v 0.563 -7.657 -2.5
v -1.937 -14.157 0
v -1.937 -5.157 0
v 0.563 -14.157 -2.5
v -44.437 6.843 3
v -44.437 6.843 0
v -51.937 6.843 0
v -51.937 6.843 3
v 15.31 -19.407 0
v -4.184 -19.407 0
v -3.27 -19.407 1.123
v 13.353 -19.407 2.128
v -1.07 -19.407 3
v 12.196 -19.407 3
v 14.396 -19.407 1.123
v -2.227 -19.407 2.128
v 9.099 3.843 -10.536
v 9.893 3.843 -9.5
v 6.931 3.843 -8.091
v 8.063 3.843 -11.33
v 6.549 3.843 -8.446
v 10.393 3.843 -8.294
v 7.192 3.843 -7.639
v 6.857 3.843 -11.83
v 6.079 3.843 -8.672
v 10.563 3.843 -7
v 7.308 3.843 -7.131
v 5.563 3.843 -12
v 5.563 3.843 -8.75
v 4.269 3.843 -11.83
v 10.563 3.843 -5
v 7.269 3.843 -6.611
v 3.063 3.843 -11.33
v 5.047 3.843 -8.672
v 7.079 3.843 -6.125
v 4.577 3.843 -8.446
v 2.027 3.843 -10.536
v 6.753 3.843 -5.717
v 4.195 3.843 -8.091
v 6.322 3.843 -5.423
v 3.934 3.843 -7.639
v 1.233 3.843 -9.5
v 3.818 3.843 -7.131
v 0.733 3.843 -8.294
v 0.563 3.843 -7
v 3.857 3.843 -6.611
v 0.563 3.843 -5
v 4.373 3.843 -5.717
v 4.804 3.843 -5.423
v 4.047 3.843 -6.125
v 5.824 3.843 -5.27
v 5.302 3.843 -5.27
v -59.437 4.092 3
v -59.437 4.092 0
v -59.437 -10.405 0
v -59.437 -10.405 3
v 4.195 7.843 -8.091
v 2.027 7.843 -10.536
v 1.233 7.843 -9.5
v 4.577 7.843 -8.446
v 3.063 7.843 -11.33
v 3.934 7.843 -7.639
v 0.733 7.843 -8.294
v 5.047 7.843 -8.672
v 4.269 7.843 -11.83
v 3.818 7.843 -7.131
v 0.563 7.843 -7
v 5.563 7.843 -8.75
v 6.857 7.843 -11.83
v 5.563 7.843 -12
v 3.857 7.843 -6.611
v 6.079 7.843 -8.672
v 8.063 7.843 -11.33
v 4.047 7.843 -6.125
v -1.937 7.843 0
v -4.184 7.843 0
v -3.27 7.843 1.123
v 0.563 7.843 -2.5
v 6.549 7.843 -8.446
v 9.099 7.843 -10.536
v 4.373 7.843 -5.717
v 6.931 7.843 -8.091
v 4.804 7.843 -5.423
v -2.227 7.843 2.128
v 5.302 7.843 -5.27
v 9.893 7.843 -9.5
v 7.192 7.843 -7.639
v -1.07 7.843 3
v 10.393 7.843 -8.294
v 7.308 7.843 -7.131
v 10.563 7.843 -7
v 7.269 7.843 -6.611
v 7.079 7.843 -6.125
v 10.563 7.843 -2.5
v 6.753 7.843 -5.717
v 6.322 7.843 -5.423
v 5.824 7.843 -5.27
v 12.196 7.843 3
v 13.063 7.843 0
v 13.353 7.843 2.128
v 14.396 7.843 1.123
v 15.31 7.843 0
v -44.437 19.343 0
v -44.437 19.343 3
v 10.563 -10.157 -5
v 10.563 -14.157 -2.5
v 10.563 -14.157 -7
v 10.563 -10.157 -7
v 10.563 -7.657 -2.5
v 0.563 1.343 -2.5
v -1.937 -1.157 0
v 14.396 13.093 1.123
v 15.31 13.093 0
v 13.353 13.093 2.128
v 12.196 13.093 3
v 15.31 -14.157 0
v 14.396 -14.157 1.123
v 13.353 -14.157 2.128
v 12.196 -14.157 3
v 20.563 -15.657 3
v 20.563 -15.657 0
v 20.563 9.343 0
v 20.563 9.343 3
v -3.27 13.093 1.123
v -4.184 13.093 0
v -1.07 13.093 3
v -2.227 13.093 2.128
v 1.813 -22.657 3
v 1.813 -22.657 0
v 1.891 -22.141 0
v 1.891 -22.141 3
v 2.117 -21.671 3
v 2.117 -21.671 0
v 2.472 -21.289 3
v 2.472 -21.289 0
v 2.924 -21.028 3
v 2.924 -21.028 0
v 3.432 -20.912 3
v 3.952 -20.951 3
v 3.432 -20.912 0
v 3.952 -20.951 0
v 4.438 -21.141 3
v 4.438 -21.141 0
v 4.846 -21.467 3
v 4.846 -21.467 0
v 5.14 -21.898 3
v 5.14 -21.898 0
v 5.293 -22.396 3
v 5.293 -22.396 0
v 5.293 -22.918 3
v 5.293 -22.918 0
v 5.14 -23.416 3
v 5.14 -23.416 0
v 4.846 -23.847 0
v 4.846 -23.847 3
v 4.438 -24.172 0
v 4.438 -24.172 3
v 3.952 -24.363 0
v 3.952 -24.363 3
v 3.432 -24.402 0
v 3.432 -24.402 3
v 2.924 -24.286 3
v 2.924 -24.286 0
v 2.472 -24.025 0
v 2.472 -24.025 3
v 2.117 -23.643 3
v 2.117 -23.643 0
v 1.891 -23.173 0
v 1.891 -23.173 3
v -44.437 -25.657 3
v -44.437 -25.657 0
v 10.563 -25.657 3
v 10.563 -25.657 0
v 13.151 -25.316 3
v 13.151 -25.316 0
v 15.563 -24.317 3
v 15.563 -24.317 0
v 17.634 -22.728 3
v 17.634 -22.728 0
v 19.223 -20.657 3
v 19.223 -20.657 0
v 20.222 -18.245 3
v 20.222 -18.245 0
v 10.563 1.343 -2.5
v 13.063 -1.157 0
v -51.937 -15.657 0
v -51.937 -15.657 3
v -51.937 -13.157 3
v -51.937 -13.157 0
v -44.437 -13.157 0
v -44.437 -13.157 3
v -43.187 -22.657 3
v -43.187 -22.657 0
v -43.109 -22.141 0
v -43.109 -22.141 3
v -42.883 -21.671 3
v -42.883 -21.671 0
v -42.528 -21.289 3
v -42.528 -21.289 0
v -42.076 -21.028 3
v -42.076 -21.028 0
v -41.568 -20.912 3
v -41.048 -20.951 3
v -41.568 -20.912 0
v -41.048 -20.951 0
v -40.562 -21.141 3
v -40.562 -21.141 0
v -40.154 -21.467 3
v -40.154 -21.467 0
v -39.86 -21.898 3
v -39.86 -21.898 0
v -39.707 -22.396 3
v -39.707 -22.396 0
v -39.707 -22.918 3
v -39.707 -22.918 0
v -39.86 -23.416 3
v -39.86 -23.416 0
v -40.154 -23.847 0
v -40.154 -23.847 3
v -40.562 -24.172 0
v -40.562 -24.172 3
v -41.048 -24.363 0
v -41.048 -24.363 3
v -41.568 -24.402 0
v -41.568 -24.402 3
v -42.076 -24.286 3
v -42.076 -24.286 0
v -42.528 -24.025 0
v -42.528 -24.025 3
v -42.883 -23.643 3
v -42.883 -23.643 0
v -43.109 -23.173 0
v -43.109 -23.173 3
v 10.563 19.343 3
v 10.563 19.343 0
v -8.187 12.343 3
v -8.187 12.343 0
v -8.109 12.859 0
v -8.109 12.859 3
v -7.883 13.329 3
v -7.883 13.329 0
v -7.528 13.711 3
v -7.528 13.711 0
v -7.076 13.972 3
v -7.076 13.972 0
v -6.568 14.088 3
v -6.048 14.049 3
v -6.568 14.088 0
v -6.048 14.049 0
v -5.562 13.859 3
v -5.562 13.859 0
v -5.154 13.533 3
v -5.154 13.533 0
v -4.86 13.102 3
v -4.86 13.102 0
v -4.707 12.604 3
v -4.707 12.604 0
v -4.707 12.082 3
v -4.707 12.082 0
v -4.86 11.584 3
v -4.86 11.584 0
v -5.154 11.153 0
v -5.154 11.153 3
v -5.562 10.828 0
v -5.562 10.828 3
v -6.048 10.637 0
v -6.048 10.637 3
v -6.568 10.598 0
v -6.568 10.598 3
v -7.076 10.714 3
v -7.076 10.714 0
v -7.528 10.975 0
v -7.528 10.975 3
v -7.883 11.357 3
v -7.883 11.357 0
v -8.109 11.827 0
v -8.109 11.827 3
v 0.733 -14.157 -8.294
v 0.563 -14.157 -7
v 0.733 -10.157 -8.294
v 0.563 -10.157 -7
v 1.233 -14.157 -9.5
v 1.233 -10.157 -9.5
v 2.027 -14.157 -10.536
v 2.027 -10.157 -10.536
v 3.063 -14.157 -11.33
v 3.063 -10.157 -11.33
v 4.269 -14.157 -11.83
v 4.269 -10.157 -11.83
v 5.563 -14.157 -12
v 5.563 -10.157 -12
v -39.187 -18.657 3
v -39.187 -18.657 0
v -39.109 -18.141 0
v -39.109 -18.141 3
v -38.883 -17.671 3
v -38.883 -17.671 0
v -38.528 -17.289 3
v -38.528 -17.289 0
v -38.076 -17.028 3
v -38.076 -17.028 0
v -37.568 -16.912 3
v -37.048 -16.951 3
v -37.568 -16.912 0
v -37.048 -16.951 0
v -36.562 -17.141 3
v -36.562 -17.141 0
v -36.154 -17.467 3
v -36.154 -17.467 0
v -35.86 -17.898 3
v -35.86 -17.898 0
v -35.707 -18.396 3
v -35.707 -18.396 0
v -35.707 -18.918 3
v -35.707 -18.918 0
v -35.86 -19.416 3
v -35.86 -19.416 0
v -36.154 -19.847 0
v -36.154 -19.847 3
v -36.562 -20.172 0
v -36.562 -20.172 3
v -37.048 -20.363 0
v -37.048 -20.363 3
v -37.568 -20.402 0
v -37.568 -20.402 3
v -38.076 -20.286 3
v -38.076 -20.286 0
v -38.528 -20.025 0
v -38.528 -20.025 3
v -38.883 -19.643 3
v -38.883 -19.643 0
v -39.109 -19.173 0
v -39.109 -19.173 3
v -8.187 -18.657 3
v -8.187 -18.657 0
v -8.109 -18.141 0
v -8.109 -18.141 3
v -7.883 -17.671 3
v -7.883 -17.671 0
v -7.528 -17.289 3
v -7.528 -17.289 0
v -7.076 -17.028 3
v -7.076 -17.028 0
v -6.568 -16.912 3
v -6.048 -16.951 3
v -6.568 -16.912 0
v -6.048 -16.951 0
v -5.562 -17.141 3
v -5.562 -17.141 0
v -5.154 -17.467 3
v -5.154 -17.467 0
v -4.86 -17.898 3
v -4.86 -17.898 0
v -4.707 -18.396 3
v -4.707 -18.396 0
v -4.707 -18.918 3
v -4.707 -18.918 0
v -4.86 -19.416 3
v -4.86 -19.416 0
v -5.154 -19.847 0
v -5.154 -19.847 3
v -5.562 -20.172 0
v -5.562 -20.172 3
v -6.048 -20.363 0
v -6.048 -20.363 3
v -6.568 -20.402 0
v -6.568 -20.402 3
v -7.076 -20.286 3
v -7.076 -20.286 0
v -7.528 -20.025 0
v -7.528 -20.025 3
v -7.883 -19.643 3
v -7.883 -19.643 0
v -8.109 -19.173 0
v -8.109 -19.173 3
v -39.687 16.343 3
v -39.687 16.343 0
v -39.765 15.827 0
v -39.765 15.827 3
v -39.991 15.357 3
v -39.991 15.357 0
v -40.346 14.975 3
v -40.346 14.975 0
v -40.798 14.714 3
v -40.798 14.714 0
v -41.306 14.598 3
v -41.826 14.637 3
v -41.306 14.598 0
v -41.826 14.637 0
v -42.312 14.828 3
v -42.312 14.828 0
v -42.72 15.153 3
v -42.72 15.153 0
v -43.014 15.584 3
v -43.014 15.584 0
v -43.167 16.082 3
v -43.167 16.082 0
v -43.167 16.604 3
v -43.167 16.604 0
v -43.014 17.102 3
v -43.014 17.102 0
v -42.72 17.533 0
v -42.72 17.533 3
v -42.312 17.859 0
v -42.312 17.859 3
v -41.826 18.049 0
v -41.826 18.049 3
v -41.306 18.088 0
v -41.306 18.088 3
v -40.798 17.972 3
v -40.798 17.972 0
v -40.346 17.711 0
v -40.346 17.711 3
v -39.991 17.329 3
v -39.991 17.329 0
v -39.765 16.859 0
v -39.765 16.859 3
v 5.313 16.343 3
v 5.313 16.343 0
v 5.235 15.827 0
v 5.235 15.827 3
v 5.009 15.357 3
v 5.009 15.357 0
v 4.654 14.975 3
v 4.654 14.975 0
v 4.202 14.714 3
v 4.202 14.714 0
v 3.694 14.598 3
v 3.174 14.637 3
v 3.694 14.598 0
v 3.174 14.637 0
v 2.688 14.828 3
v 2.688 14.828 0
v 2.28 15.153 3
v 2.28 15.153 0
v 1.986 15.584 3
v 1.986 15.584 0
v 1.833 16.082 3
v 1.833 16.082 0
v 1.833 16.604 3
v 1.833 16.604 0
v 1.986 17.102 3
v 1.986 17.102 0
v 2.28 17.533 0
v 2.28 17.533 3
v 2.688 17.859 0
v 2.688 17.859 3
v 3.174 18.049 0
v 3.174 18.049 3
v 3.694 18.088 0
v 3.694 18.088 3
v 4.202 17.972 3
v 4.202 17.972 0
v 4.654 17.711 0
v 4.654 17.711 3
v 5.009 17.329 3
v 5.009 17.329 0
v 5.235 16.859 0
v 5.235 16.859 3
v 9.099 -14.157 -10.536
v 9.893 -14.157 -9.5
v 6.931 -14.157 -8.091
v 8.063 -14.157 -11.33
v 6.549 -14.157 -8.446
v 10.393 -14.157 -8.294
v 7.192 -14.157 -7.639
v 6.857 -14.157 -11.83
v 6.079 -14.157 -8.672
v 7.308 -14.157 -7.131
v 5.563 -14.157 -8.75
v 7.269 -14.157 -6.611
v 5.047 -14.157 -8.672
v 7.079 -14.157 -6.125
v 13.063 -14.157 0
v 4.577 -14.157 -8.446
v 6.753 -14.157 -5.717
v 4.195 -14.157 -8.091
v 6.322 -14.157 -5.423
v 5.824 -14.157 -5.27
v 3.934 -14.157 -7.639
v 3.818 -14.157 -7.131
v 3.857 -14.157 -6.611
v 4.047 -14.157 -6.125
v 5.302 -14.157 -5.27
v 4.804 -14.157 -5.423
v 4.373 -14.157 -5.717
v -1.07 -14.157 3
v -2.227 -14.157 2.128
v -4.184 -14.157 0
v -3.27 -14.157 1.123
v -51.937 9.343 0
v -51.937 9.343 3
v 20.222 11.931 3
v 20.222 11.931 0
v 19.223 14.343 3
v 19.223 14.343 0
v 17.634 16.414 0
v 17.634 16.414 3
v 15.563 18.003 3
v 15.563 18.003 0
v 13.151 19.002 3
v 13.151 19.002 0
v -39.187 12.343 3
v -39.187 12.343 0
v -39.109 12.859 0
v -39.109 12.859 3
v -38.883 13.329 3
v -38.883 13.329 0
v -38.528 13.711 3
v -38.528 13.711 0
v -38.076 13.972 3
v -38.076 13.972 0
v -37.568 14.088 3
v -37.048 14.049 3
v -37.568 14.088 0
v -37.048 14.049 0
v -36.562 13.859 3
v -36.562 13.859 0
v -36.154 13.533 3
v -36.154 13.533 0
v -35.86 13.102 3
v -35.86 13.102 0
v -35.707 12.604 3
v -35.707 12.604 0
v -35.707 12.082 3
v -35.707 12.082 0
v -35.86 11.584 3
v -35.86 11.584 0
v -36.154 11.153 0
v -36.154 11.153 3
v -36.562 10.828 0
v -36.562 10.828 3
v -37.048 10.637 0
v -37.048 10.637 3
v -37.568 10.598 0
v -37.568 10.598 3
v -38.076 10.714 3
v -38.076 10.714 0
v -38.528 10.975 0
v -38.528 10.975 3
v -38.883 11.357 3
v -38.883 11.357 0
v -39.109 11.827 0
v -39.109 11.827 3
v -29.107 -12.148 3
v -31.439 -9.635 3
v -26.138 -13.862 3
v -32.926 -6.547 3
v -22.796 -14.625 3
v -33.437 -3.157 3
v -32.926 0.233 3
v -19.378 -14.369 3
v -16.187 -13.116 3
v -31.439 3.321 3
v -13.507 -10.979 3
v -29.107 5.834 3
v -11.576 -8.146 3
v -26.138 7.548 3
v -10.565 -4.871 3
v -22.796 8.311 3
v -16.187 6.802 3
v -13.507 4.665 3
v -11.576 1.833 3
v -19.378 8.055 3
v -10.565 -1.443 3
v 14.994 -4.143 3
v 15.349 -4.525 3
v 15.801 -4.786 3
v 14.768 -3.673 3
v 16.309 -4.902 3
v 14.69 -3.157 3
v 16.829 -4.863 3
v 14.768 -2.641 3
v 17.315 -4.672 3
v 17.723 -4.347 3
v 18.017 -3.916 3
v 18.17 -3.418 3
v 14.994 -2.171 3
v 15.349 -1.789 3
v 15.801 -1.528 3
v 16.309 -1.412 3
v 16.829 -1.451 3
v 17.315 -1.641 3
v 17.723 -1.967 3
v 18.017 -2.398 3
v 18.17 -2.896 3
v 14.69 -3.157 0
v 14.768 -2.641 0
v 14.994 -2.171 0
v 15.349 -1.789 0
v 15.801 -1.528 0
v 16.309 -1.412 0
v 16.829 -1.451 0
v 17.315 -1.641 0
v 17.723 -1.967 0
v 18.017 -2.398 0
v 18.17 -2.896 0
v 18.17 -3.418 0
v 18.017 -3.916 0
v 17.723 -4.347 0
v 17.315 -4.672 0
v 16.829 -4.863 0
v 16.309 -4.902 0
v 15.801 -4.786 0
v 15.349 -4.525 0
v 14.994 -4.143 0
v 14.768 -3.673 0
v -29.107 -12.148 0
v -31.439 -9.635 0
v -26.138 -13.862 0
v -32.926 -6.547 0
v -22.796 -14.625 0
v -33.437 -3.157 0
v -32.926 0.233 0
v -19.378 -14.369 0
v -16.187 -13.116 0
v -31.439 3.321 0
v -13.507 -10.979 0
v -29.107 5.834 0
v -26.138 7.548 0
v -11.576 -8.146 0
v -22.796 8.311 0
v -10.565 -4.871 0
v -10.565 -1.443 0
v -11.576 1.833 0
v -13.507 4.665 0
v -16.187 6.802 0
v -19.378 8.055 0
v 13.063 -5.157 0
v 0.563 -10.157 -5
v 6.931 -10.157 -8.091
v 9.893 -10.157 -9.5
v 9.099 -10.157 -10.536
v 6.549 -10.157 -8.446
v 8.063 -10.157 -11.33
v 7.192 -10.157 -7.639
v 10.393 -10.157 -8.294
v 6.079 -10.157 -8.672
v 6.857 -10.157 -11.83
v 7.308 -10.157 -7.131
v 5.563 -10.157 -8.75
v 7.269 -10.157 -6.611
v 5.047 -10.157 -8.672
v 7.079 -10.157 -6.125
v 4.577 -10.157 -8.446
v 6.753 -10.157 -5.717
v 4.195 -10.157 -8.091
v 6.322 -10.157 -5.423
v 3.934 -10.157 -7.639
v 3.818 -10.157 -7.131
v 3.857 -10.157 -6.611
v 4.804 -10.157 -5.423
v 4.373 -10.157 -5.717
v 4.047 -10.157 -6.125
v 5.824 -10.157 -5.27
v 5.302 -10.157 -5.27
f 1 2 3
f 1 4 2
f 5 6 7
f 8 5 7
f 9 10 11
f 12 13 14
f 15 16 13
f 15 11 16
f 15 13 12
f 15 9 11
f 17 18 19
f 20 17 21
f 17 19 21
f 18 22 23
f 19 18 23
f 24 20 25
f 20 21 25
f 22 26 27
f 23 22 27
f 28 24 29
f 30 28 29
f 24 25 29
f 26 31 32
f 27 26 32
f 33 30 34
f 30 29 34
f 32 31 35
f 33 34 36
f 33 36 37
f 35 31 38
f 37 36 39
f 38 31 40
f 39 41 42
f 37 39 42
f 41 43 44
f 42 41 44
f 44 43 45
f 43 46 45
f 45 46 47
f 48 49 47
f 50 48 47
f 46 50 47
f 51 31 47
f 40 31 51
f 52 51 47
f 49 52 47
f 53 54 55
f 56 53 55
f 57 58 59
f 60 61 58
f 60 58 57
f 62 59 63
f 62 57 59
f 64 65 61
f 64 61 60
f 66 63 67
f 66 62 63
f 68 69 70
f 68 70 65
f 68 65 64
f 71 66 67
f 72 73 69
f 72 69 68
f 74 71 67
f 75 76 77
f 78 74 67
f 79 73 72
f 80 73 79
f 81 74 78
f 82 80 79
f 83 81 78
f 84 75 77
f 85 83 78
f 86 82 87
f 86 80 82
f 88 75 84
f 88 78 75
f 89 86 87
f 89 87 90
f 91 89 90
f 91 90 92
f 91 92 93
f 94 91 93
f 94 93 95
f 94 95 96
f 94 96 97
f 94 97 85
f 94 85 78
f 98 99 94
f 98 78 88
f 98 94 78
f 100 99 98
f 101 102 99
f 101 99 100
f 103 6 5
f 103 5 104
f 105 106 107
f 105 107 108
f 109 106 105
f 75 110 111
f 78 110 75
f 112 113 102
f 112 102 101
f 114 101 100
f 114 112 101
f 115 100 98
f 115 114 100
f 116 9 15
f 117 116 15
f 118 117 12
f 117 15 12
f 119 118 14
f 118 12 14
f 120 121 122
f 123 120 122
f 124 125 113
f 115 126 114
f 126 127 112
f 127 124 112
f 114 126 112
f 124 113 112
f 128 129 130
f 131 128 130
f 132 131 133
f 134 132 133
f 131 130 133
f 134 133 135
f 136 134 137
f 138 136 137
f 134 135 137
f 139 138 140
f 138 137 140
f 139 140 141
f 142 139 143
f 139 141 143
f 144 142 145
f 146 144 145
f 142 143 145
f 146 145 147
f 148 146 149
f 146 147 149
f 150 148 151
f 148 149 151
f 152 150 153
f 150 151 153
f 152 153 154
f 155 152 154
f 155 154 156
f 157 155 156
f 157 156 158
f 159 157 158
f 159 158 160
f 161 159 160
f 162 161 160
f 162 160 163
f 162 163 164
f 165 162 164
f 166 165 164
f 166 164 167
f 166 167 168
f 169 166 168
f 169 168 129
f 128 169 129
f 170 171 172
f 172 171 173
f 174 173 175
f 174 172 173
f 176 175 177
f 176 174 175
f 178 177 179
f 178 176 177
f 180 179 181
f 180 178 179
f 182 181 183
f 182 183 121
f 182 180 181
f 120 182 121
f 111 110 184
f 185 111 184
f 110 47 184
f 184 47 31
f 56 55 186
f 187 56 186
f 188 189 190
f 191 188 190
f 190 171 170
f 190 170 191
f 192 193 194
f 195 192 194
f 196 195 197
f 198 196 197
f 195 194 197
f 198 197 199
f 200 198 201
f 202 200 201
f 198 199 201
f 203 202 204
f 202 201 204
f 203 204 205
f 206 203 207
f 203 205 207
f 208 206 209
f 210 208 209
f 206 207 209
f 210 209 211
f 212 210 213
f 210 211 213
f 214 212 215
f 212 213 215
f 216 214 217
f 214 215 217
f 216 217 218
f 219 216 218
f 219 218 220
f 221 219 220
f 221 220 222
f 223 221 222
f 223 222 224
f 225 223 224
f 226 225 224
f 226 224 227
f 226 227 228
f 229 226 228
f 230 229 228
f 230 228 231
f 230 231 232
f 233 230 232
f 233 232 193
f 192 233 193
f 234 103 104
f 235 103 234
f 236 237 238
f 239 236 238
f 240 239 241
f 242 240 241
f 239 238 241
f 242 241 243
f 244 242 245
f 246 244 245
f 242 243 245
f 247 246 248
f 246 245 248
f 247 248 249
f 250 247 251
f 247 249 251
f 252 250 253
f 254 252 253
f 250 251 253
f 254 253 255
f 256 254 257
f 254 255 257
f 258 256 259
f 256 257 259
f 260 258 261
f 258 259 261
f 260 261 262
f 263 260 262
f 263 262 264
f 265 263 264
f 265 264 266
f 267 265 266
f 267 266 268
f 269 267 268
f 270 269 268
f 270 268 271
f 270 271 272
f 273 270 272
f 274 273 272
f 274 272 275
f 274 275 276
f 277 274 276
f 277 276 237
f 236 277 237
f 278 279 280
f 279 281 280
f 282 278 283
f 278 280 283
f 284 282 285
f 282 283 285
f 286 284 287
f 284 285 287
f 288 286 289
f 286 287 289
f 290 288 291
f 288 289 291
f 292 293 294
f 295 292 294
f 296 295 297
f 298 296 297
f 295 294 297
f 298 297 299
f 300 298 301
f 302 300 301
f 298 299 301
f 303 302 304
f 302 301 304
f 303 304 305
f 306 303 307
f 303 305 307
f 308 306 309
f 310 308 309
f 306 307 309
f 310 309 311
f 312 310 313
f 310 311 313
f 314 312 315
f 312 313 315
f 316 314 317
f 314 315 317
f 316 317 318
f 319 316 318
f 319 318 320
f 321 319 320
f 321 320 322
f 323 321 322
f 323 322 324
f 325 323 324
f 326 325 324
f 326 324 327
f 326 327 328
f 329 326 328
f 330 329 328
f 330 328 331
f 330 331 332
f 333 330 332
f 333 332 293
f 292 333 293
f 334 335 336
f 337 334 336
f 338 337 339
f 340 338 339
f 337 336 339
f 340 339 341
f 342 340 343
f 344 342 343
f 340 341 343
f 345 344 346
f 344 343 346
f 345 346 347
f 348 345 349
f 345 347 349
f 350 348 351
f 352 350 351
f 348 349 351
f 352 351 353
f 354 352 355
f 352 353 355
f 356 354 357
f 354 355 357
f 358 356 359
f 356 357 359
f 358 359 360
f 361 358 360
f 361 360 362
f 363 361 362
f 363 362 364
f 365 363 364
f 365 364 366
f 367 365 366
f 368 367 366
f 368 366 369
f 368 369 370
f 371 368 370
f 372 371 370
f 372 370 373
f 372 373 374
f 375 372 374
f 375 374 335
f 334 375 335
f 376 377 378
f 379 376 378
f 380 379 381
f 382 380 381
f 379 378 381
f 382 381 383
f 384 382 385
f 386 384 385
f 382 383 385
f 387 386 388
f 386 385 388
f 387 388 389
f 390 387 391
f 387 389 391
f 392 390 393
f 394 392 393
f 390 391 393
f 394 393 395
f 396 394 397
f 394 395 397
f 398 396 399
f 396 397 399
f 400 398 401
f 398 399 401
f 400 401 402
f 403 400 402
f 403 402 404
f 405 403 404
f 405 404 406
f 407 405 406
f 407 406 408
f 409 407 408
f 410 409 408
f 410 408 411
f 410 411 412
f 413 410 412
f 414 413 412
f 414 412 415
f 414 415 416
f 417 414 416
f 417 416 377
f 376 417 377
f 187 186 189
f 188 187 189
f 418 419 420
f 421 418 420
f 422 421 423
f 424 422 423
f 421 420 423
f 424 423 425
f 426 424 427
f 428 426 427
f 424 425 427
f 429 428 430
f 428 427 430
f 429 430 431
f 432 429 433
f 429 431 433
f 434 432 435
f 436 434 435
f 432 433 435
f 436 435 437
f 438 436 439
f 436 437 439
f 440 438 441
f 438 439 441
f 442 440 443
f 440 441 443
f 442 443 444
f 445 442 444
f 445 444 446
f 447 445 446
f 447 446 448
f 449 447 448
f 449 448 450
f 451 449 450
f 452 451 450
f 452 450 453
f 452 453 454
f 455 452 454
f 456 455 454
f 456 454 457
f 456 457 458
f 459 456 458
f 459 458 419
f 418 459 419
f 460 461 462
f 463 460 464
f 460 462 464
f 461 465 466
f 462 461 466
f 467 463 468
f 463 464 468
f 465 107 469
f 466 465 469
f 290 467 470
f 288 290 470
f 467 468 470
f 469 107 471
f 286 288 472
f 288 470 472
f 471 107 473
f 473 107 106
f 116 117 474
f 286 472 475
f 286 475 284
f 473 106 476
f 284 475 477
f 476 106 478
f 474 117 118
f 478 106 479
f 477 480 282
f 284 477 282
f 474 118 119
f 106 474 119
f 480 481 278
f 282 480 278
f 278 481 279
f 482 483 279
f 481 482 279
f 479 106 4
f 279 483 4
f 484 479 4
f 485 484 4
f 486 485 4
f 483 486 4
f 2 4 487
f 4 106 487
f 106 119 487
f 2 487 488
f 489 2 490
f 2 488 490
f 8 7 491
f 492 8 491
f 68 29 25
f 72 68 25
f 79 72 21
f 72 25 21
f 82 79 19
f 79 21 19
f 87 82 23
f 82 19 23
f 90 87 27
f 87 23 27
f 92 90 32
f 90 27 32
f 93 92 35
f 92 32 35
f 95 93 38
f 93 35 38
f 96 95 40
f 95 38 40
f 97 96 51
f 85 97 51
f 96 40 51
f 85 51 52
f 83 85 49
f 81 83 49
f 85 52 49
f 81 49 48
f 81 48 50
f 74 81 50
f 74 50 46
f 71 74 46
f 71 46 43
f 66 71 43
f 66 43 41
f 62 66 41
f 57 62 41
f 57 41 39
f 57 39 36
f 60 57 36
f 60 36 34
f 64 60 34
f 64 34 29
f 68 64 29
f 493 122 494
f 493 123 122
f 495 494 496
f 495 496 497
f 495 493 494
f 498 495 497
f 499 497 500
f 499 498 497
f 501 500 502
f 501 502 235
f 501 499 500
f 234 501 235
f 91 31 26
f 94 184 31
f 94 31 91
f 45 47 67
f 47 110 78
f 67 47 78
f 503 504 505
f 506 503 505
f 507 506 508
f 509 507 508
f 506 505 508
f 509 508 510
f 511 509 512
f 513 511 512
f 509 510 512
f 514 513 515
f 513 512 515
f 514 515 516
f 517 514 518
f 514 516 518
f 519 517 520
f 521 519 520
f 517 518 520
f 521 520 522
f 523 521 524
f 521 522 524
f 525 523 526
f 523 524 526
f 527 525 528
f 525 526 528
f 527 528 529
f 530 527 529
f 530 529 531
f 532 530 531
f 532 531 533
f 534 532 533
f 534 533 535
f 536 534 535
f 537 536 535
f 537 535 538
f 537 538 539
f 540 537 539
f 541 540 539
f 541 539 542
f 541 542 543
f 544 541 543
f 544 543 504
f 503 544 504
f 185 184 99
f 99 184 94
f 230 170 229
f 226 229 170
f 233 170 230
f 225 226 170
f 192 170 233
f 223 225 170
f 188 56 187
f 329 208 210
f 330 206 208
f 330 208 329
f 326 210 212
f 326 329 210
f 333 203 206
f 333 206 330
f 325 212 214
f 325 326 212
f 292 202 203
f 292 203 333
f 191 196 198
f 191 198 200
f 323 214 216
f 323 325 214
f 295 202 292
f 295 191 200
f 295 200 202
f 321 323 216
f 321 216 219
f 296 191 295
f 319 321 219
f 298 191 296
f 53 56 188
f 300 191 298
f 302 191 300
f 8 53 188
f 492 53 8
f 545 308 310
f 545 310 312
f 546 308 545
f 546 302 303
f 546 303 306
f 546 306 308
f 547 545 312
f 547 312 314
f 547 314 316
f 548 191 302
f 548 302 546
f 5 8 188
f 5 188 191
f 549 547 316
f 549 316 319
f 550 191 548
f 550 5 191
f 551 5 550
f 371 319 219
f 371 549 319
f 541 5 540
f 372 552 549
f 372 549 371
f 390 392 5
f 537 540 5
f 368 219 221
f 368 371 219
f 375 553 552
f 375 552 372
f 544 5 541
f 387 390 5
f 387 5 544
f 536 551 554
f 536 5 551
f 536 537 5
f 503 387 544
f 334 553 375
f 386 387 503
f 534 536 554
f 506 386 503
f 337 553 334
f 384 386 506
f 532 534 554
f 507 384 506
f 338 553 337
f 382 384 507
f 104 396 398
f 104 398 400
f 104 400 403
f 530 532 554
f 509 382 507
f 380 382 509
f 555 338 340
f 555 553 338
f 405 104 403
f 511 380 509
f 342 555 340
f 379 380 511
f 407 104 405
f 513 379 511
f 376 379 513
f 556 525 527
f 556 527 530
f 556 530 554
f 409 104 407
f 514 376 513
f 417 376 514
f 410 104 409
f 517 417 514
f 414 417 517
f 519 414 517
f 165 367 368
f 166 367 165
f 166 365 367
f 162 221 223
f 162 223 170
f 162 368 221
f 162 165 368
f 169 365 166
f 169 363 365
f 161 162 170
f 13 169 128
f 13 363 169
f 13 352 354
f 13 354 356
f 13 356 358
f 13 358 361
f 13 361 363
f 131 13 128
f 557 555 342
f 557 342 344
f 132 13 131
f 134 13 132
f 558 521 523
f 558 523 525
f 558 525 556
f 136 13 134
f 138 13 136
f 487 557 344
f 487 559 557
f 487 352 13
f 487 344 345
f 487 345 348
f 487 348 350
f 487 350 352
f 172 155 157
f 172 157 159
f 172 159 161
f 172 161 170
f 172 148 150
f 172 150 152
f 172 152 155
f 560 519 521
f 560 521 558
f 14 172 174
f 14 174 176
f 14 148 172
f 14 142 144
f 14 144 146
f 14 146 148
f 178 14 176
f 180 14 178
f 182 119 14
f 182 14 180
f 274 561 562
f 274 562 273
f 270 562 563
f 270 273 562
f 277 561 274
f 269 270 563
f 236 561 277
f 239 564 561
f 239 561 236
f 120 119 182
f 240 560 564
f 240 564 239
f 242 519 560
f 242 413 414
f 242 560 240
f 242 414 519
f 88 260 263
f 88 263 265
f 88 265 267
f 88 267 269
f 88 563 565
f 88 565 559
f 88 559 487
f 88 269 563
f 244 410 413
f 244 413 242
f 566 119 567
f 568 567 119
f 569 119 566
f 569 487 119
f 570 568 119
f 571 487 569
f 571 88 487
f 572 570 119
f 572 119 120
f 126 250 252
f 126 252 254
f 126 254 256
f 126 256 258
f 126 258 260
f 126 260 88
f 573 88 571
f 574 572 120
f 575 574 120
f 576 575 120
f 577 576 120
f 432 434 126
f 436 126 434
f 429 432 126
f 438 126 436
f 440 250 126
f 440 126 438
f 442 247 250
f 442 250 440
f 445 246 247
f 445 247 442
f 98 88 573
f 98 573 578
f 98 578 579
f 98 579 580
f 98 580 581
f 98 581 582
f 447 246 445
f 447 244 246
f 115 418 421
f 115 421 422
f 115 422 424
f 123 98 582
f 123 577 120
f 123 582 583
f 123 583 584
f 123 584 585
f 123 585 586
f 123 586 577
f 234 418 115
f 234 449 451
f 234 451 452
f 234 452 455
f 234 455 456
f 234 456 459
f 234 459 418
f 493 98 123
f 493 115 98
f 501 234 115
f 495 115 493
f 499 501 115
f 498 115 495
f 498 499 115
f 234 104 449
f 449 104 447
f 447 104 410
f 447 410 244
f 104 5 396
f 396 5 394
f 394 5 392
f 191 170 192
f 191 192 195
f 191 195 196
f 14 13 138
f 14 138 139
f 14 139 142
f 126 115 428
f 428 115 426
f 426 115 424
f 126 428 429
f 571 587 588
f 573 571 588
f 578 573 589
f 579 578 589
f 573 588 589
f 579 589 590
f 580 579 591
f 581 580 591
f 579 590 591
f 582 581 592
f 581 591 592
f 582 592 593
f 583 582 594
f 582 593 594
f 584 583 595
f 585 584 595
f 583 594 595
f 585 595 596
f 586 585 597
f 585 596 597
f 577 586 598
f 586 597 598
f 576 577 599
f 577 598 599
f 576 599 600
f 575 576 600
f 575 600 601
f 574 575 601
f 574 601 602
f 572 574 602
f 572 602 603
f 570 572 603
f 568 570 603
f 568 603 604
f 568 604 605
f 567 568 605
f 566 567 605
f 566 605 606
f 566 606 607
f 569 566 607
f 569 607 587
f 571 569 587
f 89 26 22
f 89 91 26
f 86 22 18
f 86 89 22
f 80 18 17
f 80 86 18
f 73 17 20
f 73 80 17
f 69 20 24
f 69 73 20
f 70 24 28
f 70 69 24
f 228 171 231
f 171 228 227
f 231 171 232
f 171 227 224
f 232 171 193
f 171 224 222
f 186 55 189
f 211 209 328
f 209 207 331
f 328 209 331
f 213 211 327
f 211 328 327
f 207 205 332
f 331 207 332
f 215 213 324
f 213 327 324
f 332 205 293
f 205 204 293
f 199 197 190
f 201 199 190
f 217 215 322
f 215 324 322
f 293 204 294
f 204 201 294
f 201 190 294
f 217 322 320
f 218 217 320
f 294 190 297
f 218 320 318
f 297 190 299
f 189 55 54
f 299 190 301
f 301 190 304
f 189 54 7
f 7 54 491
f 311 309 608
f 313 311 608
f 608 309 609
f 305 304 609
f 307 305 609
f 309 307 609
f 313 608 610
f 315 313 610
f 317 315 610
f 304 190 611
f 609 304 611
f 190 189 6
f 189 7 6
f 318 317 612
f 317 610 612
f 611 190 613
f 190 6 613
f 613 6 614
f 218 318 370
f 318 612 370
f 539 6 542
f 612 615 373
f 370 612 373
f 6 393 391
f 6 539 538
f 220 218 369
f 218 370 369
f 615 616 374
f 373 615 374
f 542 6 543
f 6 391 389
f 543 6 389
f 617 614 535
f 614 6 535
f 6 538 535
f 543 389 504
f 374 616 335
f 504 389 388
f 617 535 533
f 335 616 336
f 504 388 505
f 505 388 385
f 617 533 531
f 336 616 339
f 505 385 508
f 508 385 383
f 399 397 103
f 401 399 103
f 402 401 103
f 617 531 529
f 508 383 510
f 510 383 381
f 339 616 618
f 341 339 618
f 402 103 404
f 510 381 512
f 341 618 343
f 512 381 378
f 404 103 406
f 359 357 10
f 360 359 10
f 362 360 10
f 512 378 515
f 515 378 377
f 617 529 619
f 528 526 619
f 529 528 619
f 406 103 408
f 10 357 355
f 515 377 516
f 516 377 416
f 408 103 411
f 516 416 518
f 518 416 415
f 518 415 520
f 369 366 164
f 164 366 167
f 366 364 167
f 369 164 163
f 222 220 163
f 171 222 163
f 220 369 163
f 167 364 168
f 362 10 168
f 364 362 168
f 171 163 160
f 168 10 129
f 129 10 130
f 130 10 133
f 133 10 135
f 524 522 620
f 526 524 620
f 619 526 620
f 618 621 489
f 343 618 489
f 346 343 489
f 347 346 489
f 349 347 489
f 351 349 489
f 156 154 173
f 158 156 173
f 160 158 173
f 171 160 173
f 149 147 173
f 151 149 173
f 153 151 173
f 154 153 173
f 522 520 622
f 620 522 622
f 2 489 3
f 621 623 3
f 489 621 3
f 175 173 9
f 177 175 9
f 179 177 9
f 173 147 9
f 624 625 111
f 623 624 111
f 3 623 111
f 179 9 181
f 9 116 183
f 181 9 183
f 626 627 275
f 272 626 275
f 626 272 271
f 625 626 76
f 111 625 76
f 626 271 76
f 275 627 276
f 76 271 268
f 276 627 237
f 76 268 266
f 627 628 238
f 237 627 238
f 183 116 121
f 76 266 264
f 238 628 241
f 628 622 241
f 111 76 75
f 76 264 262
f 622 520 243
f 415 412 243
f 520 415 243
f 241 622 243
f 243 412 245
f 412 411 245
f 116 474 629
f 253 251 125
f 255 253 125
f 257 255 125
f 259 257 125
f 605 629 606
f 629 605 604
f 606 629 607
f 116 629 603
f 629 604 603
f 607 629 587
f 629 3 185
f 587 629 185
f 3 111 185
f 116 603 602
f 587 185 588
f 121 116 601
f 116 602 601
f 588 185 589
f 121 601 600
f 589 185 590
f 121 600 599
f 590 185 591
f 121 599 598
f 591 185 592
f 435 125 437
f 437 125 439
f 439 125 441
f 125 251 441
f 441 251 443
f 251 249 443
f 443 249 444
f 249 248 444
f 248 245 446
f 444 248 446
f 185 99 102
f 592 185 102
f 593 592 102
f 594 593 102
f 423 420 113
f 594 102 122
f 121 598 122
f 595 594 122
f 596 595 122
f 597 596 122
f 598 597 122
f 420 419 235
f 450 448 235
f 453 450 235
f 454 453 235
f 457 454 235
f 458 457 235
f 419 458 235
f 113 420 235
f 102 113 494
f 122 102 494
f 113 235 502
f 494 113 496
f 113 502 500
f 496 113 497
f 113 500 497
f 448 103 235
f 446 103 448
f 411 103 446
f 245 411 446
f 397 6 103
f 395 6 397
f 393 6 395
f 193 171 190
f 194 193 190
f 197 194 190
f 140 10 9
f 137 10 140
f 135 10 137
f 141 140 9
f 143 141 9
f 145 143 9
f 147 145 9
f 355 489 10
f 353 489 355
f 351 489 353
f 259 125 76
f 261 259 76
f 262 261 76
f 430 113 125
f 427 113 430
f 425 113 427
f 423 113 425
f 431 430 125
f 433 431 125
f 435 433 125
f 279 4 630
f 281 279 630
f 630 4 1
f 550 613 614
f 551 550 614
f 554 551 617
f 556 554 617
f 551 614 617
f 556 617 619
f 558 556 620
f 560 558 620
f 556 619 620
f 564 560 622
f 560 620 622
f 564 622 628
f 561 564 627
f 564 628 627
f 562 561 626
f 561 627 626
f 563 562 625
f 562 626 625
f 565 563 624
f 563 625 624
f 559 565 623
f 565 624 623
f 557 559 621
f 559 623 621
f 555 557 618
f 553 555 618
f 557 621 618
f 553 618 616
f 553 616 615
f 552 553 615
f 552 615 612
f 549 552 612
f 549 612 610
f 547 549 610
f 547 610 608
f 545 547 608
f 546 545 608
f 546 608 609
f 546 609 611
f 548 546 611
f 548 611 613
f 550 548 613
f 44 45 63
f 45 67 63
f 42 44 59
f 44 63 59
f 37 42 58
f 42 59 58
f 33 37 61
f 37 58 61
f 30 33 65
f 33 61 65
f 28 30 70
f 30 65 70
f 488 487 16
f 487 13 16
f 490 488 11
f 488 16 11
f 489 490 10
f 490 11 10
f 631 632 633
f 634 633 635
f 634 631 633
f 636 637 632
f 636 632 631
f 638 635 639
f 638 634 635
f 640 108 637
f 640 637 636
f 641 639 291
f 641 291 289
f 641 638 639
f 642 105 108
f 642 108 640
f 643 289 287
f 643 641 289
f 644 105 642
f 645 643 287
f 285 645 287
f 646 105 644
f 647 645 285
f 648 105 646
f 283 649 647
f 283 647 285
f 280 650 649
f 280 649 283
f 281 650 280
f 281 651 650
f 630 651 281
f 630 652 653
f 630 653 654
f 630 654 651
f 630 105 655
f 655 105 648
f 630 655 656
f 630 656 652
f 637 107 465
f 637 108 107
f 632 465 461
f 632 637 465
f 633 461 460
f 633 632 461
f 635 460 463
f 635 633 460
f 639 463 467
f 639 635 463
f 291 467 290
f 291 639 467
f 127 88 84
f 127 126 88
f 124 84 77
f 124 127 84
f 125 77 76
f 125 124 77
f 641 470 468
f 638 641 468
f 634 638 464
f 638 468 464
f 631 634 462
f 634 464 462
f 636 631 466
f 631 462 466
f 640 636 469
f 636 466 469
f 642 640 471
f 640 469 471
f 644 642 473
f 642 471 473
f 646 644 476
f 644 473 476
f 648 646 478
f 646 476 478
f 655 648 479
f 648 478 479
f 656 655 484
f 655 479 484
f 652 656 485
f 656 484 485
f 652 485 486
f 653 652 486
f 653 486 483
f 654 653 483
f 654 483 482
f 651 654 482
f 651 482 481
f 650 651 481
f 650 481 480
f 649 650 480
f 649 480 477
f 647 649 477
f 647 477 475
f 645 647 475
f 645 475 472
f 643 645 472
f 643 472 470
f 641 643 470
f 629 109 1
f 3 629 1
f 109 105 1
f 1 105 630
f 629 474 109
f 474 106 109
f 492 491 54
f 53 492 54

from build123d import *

# Parameters (mm, degrees)
SKETCH1_W           = 65
SKETCH1_H           = 45
BOSS_EXTRUDE1_DEPTH = 3
FILLET4_R           = 10
BOSS_EXTRUDE4_DEPTH = 3
SKETCH9_R           = 1.75
CUT_EXTRUDE5_DEPTH  = 5
SKETCH10_R          = 1.75
SKETCH10_R_2        = 11.5
CUT_EXTRUDE6_DEPTH  = 5
SKETCH2_W           = 10
SKETCH2_H           = 4
BOSS_EXTRUDE5_DEPTH = 12
SKETCH11_R          = 1.75
CUT_EXTRUDE7_DEPTH  = 22
CHAMFER3_SIZE       = 2.5
CHAMFER4_SIZE       = 5
FILLET5_R           = 5
SKETCH13_W          = 12
SKETCH13_H          = 5.25


with BuildPart() as part:
    # Sketch1 → Boss-Extrude1 (new body)
    with BuildSketch(Plane.XY):
        with Locations((-11.936997319, -3.156836461)):
            Rectangle(SKETCH1_W, SKETCH1_H)
    extrude(amount=BOSS_EXTRUDE1_DEPTH)

    # Fillet4
    fillet4_edges = [part.edges().sort_by_distance(p)[0] for p in [
        (20.563002681, 19.343163539, 1.5),
        (20.563002681, -25.656836461, 1.5),
    ]]
    fillet(fillet4_edges, radius=FILLET4_R)

    # Sketch8 → Boss-Extrude4 (add)
    with BuildSketch(Plane(origin=(0, 0, 0), x_dir=(-1, 0, 0), z_dir=(0, 0, -1))):
        Polygon((44.436997319, 6.843163539), (51.936997319, 6.843163539), (51.936997319, 9.343163539), (59.436997319, 4.091607002), (59.436997319, -10.405279925), (51.936997319, -15.656836461), (51.936997319, -13.156836461), (44.436997319, -13.156836461), align=None)
    extrude(amount=-BOSS_EXTRUDE4_DEPTH)

    # Sketch9 → Cut-Extrude5 (cut)
    with BuildSketch(Plane(origin=(0, 0, 0), x_dir=(-1, 0, 0), z_dir=(0, 0, -1))):
        with Locations((-16.440039295, -3.156836461)):
            Circle(SKETCH9_R)
        with Locations((-3.563002681, -22.656836461)):
            Circle(SKETCH9_R)
        with Locations((41.436997319, -22.656836461)):
            Circle(SKETCH9_R)
        with Locations(Location((41.436997319, 16.343163539, 0), (0, 0, 180))):
            Circle(SKETCH9_R)
        with Locations(Location((-3.563002681, 16.343163539, 0), (0, 0, 180))):
            Circle(SKETCH9_R)
    extrude(amount=-CUT_EXTRUDE5_DEPTH, mode=Mode.SUBTRACT)

    # Sketch10 → Cut-Extrude6 (cut)
    with BuildSketch(Plane(origin=(0, 0, 0), x_dir=(-1, 0, 0), z_dir=(0, 0, -1))):
        with Locations((6.436997319, -18.656836461)):
            Circle(SKETCH10_R)
        with Locations((37.436997319, 12.343163539)):
            Circle(SKETCH10_R)
        with Locations((6.436997319, 12.343163539)):
            Circle(SKETCH10_R)
        with Locations((37.436997319, -18.656836461)):
            Circle(SKETCH10_R)
        with Locations((21.936997319, -3.156836461)):
            Circle(SKETCH10_R_2)
    extrude(amount=-CUT_EXTRUDE6_DEPTH, mode=Mode.SUBTRACT)

    # Sketch2 → Boss-Extrude5 (add)
    with BuildSketch(Plane(origin=(0, 0, 0), x_dir=(-1, 0, 0), z_dir=(0, 0, -1))):
        with Locations((-5.563002681, 5.843163539)):
            Rectangle(SKETCH2_W, SKETCH2_H)
        with Locations((-5.563002681, -12.156836461)):
            Rectangle(SKETCH2_W, SKETCH2_H)
    extrude(amount=BOSS_EXTRUDE5_DEPTH)

    # Sketch11 → Cut-Extrude7 (cut)
    with BuildSketch(Plane.XZ.offset(14.156836461)):
        with Locations(Location((5.563002681, -7, 0), (0, 0, 270))):
            Circle(SKETCH11_R)
    extrude(amount=-CUT_EXTRUDE7_DEPTH, mode=Mode.SUBTRACT)

    # Chamfer3
    chamfer3_edges = [part.edges().sort_by_distance(p)[0] for p in [
        (10.563002681, -12.156836461, 0),
        (0.563002681, -12.156836461, 0),
        (0.563002681, 5.843163539, 0),
        (10.563002681, 5.843163539, 0),
    ]]
    chamfer(chamfer3_edges, length=CHAMFER3_SIZE)

    # Chamfer4
    chamfer4_edges = [part.edges().sort_by_distance(p)[0] for p in [
        (5.563002681, -10.156836461, 0),
        (5.563002681, 3.843163539, 0),
    ]]
    chamfer(chamfer4_edges, length=CHAMFER4_SIZE)

    # Fillet5
    fillet5_edges = [part.edges().sort_by_distance(p)[0] for p in [
        (0.563002681, -12.156836461, -12),
        (10.563002681, -12.156836461, -12),
        (0.563002681, 5.843163539, -12),
        (10.563002681, 5.843163539, -12),
    ]]
    fillet(fillet5_edges, radius=FILLET5_R - 0.0001)  # a hair under: the kernel refuses the full size

    # Sketch13 → Cut-Revolve1 (revolve, cut)
    with BuildSketch(Plane(origin=(5.563002681, 0, 0), x_dir=(0, 0, -1), z_dir=(1, 0, 0))):
        with Locations((13, 10.468163539)):
            Rectangle(SKETCH13_W, SKETCH13_H)
    cut_revolve1 = revolve(axis=Axis((5.563002681, 7.843163539, -7), (0, -1, 0)), mode=Mode.SUBTRACT)

    # Mirror1: Cut-Revolve1 across plane
    add(cut_revolve1.mirror(Plane.ZX.offset(-3.156836461)), mode=Mode.SUBTRACT)


solid = part.part
